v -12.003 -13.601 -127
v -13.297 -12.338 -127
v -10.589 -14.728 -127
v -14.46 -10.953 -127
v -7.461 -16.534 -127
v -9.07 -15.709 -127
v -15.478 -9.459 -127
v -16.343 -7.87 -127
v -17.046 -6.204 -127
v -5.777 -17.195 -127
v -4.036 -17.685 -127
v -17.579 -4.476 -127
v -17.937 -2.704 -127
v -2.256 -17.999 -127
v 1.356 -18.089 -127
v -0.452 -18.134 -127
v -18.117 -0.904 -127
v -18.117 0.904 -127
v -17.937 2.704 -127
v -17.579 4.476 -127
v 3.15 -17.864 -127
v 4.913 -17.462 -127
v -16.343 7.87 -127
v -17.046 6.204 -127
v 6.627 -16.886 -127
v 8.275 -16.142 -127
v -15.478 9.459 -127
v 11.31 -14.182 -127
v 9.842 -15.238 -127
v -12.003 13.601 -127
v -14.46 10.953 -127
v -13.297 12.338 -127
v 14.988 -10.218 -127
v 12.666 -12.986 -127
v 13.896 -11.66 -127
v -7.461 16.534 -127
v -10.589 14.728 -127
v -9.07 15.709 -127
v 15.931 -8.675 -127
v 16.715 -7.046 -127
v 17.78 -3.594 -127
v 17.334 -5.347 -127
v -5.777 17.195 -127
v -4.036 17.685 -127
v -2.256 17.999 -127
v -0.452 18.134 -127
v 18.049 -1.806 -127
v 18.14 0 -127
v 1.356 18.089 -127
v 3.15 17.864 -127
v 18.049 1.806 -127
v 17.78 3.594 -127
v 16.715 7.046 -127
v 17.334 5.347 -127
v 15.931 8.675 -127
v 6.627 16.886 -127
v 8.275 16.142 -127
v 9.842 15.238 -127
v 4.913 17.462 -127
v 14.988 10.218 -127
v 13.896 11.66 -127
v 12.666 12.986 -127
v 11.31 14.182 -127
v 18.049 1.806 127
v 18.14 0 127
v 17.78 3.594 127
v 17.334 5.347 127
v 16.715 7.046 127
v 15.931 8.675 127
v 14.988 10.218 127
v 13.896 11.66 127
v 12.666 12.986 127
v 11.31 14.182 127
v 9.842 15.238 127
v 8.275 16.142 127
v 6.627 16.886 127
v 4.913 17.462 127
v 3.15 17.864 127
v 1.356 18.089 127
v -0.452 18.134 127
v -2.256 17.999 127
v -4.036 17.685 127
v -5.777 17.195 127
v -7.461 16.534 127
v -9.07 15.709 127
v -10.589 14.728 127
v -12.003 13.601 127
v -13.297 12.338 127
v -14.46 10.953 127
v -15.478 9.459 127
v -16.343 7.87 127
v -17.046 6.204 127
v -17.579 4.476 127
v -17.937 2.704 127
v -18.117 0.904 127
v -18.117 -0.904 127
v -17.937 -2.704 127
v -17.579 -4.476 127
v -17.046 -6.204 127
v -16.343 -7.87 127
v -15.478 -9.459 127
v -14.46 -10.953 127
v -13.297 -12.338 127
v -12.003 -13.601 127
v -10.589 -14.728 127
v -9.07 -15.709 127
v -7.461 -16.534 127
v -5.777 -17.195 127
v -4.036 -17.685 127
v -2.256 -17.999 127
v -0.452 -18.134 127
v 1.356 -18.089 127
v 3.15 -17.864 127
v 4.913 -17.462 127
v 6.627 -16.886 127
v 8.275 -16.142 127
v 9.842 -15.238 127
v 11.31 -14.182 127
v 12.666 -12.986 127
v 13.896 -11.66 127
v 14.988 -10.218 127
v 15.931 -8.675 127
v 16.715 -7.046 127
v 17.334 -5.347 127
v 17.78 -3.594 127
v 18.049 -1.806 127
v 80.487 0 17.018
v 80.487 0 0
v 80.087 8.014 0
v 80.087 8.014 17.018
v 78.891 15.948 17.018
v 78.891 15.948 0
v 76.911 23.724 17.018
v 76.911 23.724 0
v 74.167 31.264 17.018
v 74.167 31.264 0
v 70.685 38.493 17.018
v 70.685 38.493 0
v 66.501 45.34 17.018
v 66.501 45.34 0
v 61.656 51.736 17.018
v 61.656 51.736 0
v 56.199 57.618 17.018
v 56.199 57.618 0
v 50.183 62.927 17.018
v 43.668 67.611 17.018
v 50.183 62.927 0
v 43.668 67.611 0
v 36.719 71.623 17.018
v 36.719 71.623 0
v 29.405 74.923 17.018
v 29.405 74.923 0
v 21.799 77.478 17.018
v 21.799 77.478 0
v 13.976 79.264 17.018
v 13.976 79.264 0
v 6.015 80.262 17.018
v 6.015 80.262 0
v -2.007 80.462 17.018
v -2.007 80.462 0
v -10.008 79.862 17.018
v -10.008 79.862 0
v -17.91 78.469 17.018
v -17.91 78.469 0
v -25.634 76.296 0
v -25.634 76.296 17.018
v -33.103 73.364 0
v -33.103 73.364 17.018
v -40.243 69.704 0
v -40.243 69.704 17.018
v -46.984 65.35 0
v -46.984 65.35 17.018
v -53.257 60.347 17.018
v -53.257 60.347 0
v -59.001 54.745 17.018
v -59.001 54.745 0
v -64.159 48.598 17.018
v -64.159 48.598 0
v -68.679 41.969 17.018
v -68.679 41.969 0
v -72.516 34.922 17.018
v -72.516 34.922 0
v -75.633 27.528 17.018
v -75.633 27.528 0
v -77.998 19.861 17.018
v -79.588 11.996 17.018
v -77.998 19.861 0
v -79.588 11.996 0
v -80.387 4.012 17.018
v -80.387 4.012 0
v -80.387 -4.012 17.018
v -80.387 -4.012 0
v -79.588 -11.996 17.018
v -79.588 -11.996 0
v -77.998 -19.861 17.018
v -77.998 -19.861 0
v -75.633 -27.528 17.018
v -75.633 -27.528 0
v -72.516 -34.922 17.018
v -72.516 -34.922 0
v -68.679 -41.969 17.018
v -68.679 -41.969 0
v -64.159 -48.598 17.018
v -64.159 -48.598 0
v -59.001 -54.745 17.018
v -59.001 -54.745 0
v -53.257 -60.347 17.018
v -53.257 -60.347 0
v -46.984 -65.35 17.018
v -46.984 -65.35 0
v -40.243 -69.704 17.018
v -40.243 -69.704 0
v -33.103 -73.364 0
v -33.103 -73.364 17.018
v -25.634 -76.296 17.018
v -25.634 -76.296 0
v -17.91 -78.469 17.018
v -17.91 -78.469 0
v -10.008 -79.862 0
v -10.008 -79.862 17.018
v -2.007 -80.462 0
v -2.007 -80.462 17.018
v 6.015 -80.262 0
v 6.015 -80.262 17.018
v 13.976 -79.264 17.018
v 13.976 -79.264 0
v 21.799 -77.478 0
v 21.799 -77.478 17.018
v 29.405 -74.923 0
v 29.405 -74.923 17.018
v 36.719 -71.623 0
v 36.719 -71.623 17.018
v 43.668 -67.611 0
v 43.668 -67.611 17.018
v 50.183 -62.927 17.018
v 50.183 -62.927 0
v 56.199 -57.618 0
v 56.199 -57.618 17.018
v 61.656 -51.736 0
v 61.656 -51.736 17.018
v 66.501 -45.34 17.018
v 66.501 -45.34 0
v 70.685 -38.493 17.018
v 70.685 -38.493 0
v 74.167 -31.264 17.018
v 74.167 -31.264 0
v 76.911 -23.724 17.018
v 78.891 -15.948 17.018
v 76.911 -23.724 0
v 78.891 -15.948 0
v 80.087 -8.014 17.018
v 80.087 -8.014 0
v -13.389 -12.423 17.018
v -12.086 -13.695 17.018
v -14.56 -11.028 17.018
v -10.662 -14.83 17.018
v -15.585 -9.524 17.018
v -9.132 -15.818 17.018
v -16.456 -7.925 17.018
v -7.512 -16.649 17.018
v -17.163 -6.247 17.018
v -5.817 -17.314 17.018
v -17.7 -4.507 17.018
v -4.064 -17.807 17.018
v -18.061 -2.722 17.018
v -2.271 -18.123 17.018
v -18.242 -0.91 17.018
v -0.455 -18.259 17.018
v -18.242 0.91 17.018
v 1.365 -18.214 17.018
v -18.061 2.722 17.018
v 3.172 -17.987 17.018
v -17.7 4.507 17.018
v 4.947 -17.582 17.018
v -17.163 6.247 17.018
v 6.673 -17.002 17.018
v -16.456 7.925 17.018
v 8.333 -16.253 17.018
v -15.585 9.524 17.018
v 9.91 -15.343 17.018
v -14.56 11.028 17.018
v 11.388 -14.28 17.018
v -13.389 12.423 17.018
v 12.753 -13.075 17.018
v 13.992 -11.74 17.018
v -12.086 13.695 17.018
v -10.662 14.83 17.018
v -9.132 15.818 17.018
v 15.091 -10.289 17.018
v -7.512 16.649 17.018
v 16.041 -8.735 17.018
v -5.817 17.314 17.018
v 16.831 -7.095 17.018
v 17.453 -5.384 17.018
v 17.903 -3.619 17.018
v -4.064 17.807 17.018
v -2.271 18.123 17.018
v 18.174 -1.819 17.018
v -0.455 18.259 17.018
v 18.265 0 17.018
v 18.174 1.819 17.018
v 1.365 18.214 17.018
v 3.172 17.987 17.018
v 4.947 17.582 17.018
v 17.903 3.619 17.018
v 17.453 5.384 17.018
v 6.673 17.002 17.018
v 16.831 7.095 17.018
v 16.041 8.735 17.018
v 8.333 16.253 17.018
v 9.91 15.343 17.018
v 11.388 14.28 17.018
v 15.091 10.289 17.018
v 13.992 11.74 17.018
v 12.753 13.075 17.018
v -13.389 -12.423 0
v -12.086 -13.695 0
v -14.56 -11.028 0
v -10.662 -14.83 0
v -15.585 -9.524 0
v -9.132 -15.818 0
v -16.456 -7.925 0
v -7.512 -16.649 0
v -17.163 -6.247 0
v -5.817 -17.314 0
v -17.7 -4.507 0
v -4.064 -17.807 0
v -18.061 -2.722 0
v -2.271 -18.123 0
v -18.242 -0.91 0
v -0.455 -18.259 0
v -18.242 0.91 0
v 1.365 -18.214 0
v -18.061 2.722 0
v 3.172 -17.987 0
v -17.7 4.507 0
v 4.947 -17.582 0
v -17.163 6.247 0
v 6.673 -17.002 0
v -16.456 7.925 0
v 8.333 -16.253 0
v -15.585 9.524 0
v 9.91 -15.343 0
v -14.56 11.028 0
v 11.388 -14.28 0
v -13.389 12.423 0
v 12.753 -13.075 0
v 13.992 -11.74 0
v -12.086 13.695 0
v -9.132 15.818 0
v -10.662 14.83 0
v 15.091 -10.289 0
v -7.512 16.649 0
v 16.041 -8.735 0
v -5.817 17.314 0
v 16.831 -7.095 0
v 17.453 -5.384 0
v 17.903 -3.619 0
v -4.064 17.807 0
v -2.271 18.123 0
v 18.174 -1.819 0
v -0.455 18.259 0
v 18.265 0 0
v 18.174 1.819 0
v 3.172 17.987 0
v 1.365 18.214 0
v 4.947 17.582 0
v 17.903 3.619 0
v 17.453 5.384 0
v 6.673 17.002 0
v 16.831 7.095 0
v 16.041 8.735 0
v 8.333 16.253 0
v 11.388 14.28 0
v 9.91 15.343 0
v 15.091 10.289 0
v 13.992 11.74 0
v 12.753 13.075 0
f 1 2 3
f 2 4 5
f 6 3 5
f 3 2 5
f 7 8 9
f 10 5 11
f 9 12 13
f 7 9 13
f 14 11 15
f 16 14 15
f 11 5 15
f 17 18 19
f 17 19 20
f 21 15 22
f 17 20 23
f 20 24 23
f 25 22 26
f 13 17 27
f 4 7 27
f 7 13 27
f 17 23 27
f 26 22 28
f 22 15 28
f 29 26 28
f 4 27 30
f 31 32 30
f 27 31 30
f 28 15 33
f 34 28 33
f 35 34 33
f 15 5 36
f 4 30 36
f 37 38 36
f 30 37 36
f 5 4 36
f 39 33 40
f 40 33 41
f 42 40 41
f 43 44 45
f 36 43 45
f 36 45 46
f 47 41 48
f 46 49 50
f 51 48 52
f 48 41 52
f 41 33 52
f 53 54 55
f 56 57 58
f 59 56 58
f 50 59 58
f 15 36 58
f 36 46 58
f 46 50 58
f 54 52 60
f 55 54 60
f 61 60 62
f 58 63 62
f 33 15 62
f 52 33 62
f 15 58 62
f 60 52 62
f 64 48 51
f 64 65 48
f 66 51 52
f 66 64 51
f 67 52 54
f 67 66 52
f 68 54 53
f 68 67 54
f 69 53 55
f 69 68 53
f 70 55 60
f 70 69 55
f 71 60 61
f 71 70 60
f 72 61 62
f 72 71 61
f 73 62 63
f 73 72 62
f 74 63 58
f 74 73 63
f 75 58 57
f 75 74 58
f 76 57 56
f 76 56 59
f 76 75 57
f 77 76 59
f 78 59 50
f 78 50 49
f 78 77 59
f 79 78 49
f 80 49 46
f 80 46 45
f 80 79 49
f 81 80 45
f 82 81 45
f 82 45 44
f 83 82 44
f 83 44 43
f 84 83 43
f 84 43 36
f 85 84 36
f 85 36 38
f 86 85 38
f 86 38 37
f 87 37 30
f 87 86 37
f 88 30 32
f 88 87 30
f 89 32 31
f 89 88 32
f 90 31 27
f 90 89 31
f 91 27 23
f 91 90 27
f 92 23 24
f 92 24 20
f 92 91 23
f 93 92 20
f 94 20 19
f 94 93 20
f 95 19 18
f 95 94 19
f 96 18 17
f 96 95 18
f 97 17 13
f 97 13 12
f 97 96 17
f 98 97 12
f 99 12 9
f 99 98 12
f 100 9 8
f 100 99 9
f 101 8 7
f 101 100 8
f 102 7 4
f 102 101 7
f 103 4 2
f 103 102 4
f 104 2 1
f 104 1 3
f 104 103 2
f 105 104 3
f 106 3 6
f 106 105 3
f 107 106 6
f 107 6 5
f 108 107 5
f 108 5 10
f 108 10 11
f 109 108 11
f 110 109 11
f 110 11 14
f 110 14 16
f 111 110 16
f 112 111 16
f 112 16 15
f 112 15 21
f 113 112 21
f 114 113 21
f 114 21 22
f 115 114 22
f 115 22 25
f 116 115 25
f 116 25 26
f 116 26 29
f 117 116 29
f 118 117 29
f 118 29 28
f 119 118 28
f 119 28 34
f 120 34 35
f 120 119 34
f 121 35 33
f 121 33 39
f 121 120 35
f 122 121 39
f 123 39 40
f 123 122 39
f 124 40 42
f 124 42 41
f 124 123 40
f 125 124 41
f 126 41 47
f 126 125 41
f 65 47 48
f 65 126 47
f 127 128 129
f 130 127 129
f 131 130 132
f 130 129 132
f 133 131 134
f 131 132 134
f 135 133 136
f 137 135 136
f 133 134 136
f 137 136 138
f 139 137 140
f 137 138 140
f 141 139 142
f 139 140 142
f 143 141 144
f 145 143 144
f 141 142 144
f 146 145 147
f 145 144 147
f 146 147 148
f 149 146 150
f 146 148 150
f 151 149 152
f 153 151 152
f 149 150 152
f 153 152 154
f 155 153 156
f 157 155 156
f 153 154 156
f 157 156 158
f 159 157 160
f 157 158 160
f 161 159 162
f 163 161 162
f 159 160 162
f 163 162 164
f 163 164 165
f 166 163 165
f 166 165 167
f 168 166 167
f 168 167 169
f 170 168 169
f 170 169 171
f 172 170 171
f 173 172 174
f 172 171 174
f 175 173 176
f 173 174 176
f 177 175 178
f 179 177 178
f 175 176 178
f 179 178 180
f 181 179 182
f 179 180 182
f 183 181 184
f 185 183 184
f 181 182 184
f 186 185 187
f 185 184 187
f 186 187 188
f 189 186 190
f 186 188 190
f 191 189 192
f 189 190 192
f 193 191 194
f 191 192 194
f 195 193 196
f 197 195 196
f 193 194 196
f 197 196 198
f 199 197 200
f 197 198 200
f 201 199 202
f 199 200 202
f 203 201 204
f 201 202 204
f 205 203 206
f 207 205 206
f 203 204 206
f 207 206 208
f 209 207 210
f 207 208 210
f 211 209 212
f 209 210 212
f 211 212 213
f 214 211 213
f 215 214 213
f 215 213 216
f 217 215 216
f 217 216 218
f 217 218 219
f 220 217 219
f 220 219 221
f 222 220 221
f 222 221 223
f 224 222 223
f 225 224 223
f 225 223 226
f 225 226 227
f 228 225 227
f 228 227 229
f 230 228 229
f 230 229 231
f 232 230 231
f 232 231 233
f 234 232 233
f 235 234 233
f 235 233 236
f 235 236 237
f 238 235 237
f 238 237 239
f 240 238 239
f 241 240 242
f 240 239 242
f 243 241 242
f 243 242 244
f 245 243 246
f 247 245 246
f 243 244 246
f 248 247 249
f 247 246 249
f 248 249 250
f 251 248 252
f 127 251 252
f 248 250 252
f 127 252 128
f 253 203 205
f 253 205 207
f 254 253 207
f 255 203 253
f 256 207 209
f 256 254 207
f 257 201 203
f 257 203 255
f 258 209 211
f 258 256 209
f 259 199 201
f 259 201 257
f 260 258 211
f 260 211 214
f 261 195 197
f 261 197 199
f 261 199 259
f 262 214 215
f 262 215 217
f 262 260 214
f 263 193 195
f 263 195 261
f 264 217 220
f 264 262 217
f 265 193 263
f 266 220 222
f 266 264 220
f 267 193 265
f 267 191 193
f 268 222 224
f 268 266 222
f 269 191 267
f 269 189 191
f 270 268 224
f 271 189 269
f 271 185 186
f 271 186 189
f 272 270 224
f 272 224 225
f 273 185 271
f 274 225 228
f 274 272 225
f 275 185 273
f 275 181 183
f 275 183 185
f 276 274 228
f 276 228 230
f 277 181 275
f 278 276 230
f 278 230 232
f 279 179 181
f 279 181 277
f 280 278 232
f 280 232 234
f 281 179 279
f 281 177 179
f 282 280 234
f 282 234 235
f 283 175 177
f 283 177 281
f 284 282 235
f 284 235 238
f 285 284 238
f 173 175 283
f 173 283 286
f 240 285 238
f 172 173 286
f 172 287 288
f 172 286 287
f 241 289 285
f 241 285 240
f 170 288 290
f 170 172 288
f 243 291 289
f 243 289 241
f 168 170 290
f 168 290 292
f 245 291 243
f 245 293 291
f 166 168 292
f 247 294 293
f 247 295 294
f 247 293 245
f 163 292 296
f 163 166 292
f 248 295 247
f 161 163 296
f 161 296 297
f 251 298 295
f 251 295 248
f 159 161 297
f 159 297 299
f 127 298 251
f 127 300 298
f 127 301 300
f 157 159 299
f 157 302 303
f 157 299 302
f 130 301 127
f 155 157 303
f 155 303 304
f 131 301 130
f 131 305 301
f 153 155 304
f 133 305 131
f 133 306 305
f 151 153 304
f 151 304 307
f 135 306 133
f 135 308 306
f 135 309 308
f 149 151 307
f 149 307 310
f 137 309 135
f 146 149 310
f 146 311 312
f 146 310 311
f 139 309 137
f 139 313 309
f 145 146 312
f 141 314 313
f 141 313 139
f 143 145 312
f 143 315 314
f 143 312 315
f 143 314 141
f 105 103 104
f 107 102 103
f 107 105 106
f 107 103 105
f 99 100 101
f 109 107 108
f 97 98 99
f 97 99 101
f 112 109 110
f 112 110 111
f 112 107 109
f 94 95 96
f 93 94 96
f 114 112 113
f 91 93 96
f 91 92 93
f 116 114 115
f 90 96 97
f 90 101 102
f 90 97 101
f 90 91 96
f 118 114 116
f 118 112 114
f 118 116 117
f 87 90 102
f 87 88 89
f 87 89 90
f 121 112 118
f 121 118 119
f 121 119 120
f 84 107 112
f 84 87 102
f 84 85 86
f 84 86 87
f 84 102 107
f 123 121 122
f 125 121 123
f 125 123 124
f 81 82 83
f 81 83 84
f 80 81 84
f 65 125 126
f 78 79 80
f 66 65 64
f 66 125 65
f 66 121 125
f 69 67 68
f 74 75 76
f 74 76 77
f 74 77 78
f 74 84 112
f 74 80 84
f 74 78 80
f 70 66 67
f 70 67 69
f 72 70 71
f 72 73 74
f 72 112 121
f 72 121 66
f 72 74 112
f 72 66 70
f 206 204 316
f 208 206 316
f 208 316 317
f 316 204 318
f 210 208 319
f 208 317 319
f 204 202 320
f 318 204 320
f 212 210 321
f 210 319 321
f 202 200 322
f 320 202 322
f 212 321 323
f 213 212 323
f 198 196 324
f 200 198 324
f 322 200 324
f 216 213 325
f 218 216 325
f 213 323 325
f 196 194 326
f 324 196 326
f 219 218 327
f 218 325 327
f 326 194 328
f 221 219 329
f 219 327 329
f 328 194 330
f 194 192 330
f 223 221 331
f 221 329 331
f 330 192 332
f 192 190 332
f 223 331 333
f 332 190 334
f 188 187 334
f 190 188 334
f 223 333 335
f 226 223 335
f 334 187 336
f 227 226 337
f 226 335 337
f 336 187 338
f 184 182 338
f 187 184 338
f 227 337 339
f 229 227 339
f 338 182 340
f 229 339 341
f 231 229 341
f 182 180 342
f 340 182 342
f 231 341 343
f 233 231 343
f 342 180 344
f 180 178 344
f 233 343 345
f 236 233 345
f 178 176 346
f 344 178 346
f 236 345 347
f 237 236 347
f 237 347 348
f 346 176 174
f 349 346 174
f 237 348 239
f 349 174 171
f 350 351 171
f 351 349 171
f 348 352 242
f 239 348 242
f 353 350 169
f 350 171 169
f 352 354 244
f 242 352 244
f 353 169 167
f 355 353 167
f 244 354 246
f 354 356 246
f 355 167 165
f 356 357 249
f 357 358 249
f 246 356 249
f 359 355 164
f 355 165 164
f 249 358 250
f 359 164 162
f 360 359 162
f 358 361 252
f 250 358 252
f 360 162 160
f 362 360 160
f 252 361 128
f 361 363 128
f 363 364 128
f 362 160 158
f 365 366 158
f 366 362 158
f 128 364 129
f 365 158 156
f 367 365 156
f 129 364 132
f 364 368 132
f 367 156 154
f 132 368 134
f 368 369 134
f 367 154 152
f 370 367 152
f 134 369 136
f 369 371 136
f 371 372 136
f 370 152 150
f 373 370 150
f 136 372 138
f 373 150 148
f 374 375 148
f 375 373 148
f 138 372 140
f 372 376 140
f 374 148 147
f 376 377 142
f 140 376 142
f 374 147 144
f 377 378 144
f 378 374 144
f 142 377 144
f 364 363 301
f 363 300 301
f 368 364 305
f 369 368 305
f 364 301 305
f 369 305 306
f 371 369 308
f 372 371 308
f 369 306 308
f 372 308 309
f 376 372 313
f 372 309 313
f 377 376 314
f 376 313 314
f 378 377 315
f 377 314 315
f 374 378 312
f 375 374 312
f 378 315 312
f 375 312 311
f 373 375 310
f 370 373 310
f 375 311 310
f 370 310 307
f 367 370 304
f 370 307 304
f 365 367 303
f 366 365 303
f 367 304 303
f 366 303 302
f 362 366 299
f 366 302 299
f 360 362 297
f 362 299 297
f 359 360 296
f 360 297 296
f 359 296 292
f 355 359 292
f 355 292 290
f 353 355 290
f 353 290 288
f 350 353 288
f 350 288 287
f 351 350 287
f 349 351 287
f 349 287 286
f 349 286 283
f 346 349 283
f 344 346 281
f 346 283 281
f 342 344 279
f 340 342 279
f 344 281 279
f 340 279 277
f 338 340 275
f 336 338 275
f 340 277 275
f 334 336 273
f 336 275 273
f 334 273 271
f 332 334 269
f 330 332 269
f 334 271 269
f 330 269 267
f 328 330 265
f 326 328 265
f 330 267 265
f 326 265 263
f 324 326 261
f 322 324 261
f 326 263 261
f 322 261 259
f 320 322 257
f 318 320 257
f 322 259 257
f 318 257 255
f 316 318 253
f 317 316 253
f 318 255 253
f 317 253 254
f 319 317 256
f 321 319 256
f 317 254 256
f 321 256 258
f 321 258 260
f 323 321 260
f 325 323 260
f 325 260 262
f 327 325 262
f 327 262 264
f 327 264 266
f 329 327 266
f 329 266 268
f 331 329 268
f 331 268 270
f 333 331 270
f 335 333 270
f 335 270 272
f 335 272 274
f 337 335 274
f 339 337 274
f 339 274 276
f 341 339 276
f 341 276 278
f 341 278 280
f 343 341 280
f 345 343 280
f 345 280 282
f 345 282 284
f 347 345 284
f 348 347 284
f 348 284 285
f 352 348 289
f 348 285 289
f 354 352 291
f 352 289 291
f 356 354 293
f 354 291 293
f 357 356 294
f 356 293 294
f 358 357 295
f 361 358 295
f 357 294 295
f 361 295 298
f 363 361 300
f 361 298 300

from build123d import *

# Parameters (mm, degrees)
F0_R     = 80.4867101045
F1_DEPTH = 17.018
F2_R     = 18.1396053128
F3_DEPTH = 127
F4_R     = 18.2649107144
F4_R_2   = 18.1396053128
F5_DEPTH = 50.8


with BuildPart() as f1:
    # F0 (on Top) → F1 (new body)
    with BuildSketch(Plane.XY):
        Circle(F0_R)
    extrude(amount=F1_DEPTH)

    # F2 (on Top) → F3 (join, symmetric)
    with BuildSketch(Plane.XY):
        Circle(F2_R)
    extrude(amount=F3_DEPTH, both=True)

    # F4 (on face) → F5 (cut, symmetric)
    with BuildSketch(Plane.XY.offset(17.018)):
        Circle(F4_R)
        Circle(F4_R_2, mode=Mode.SUBTRACT)
    extrude(amount=F5_DEPTH, both=True, mode=Mode.SUBTRACT)


solid = f1.part
